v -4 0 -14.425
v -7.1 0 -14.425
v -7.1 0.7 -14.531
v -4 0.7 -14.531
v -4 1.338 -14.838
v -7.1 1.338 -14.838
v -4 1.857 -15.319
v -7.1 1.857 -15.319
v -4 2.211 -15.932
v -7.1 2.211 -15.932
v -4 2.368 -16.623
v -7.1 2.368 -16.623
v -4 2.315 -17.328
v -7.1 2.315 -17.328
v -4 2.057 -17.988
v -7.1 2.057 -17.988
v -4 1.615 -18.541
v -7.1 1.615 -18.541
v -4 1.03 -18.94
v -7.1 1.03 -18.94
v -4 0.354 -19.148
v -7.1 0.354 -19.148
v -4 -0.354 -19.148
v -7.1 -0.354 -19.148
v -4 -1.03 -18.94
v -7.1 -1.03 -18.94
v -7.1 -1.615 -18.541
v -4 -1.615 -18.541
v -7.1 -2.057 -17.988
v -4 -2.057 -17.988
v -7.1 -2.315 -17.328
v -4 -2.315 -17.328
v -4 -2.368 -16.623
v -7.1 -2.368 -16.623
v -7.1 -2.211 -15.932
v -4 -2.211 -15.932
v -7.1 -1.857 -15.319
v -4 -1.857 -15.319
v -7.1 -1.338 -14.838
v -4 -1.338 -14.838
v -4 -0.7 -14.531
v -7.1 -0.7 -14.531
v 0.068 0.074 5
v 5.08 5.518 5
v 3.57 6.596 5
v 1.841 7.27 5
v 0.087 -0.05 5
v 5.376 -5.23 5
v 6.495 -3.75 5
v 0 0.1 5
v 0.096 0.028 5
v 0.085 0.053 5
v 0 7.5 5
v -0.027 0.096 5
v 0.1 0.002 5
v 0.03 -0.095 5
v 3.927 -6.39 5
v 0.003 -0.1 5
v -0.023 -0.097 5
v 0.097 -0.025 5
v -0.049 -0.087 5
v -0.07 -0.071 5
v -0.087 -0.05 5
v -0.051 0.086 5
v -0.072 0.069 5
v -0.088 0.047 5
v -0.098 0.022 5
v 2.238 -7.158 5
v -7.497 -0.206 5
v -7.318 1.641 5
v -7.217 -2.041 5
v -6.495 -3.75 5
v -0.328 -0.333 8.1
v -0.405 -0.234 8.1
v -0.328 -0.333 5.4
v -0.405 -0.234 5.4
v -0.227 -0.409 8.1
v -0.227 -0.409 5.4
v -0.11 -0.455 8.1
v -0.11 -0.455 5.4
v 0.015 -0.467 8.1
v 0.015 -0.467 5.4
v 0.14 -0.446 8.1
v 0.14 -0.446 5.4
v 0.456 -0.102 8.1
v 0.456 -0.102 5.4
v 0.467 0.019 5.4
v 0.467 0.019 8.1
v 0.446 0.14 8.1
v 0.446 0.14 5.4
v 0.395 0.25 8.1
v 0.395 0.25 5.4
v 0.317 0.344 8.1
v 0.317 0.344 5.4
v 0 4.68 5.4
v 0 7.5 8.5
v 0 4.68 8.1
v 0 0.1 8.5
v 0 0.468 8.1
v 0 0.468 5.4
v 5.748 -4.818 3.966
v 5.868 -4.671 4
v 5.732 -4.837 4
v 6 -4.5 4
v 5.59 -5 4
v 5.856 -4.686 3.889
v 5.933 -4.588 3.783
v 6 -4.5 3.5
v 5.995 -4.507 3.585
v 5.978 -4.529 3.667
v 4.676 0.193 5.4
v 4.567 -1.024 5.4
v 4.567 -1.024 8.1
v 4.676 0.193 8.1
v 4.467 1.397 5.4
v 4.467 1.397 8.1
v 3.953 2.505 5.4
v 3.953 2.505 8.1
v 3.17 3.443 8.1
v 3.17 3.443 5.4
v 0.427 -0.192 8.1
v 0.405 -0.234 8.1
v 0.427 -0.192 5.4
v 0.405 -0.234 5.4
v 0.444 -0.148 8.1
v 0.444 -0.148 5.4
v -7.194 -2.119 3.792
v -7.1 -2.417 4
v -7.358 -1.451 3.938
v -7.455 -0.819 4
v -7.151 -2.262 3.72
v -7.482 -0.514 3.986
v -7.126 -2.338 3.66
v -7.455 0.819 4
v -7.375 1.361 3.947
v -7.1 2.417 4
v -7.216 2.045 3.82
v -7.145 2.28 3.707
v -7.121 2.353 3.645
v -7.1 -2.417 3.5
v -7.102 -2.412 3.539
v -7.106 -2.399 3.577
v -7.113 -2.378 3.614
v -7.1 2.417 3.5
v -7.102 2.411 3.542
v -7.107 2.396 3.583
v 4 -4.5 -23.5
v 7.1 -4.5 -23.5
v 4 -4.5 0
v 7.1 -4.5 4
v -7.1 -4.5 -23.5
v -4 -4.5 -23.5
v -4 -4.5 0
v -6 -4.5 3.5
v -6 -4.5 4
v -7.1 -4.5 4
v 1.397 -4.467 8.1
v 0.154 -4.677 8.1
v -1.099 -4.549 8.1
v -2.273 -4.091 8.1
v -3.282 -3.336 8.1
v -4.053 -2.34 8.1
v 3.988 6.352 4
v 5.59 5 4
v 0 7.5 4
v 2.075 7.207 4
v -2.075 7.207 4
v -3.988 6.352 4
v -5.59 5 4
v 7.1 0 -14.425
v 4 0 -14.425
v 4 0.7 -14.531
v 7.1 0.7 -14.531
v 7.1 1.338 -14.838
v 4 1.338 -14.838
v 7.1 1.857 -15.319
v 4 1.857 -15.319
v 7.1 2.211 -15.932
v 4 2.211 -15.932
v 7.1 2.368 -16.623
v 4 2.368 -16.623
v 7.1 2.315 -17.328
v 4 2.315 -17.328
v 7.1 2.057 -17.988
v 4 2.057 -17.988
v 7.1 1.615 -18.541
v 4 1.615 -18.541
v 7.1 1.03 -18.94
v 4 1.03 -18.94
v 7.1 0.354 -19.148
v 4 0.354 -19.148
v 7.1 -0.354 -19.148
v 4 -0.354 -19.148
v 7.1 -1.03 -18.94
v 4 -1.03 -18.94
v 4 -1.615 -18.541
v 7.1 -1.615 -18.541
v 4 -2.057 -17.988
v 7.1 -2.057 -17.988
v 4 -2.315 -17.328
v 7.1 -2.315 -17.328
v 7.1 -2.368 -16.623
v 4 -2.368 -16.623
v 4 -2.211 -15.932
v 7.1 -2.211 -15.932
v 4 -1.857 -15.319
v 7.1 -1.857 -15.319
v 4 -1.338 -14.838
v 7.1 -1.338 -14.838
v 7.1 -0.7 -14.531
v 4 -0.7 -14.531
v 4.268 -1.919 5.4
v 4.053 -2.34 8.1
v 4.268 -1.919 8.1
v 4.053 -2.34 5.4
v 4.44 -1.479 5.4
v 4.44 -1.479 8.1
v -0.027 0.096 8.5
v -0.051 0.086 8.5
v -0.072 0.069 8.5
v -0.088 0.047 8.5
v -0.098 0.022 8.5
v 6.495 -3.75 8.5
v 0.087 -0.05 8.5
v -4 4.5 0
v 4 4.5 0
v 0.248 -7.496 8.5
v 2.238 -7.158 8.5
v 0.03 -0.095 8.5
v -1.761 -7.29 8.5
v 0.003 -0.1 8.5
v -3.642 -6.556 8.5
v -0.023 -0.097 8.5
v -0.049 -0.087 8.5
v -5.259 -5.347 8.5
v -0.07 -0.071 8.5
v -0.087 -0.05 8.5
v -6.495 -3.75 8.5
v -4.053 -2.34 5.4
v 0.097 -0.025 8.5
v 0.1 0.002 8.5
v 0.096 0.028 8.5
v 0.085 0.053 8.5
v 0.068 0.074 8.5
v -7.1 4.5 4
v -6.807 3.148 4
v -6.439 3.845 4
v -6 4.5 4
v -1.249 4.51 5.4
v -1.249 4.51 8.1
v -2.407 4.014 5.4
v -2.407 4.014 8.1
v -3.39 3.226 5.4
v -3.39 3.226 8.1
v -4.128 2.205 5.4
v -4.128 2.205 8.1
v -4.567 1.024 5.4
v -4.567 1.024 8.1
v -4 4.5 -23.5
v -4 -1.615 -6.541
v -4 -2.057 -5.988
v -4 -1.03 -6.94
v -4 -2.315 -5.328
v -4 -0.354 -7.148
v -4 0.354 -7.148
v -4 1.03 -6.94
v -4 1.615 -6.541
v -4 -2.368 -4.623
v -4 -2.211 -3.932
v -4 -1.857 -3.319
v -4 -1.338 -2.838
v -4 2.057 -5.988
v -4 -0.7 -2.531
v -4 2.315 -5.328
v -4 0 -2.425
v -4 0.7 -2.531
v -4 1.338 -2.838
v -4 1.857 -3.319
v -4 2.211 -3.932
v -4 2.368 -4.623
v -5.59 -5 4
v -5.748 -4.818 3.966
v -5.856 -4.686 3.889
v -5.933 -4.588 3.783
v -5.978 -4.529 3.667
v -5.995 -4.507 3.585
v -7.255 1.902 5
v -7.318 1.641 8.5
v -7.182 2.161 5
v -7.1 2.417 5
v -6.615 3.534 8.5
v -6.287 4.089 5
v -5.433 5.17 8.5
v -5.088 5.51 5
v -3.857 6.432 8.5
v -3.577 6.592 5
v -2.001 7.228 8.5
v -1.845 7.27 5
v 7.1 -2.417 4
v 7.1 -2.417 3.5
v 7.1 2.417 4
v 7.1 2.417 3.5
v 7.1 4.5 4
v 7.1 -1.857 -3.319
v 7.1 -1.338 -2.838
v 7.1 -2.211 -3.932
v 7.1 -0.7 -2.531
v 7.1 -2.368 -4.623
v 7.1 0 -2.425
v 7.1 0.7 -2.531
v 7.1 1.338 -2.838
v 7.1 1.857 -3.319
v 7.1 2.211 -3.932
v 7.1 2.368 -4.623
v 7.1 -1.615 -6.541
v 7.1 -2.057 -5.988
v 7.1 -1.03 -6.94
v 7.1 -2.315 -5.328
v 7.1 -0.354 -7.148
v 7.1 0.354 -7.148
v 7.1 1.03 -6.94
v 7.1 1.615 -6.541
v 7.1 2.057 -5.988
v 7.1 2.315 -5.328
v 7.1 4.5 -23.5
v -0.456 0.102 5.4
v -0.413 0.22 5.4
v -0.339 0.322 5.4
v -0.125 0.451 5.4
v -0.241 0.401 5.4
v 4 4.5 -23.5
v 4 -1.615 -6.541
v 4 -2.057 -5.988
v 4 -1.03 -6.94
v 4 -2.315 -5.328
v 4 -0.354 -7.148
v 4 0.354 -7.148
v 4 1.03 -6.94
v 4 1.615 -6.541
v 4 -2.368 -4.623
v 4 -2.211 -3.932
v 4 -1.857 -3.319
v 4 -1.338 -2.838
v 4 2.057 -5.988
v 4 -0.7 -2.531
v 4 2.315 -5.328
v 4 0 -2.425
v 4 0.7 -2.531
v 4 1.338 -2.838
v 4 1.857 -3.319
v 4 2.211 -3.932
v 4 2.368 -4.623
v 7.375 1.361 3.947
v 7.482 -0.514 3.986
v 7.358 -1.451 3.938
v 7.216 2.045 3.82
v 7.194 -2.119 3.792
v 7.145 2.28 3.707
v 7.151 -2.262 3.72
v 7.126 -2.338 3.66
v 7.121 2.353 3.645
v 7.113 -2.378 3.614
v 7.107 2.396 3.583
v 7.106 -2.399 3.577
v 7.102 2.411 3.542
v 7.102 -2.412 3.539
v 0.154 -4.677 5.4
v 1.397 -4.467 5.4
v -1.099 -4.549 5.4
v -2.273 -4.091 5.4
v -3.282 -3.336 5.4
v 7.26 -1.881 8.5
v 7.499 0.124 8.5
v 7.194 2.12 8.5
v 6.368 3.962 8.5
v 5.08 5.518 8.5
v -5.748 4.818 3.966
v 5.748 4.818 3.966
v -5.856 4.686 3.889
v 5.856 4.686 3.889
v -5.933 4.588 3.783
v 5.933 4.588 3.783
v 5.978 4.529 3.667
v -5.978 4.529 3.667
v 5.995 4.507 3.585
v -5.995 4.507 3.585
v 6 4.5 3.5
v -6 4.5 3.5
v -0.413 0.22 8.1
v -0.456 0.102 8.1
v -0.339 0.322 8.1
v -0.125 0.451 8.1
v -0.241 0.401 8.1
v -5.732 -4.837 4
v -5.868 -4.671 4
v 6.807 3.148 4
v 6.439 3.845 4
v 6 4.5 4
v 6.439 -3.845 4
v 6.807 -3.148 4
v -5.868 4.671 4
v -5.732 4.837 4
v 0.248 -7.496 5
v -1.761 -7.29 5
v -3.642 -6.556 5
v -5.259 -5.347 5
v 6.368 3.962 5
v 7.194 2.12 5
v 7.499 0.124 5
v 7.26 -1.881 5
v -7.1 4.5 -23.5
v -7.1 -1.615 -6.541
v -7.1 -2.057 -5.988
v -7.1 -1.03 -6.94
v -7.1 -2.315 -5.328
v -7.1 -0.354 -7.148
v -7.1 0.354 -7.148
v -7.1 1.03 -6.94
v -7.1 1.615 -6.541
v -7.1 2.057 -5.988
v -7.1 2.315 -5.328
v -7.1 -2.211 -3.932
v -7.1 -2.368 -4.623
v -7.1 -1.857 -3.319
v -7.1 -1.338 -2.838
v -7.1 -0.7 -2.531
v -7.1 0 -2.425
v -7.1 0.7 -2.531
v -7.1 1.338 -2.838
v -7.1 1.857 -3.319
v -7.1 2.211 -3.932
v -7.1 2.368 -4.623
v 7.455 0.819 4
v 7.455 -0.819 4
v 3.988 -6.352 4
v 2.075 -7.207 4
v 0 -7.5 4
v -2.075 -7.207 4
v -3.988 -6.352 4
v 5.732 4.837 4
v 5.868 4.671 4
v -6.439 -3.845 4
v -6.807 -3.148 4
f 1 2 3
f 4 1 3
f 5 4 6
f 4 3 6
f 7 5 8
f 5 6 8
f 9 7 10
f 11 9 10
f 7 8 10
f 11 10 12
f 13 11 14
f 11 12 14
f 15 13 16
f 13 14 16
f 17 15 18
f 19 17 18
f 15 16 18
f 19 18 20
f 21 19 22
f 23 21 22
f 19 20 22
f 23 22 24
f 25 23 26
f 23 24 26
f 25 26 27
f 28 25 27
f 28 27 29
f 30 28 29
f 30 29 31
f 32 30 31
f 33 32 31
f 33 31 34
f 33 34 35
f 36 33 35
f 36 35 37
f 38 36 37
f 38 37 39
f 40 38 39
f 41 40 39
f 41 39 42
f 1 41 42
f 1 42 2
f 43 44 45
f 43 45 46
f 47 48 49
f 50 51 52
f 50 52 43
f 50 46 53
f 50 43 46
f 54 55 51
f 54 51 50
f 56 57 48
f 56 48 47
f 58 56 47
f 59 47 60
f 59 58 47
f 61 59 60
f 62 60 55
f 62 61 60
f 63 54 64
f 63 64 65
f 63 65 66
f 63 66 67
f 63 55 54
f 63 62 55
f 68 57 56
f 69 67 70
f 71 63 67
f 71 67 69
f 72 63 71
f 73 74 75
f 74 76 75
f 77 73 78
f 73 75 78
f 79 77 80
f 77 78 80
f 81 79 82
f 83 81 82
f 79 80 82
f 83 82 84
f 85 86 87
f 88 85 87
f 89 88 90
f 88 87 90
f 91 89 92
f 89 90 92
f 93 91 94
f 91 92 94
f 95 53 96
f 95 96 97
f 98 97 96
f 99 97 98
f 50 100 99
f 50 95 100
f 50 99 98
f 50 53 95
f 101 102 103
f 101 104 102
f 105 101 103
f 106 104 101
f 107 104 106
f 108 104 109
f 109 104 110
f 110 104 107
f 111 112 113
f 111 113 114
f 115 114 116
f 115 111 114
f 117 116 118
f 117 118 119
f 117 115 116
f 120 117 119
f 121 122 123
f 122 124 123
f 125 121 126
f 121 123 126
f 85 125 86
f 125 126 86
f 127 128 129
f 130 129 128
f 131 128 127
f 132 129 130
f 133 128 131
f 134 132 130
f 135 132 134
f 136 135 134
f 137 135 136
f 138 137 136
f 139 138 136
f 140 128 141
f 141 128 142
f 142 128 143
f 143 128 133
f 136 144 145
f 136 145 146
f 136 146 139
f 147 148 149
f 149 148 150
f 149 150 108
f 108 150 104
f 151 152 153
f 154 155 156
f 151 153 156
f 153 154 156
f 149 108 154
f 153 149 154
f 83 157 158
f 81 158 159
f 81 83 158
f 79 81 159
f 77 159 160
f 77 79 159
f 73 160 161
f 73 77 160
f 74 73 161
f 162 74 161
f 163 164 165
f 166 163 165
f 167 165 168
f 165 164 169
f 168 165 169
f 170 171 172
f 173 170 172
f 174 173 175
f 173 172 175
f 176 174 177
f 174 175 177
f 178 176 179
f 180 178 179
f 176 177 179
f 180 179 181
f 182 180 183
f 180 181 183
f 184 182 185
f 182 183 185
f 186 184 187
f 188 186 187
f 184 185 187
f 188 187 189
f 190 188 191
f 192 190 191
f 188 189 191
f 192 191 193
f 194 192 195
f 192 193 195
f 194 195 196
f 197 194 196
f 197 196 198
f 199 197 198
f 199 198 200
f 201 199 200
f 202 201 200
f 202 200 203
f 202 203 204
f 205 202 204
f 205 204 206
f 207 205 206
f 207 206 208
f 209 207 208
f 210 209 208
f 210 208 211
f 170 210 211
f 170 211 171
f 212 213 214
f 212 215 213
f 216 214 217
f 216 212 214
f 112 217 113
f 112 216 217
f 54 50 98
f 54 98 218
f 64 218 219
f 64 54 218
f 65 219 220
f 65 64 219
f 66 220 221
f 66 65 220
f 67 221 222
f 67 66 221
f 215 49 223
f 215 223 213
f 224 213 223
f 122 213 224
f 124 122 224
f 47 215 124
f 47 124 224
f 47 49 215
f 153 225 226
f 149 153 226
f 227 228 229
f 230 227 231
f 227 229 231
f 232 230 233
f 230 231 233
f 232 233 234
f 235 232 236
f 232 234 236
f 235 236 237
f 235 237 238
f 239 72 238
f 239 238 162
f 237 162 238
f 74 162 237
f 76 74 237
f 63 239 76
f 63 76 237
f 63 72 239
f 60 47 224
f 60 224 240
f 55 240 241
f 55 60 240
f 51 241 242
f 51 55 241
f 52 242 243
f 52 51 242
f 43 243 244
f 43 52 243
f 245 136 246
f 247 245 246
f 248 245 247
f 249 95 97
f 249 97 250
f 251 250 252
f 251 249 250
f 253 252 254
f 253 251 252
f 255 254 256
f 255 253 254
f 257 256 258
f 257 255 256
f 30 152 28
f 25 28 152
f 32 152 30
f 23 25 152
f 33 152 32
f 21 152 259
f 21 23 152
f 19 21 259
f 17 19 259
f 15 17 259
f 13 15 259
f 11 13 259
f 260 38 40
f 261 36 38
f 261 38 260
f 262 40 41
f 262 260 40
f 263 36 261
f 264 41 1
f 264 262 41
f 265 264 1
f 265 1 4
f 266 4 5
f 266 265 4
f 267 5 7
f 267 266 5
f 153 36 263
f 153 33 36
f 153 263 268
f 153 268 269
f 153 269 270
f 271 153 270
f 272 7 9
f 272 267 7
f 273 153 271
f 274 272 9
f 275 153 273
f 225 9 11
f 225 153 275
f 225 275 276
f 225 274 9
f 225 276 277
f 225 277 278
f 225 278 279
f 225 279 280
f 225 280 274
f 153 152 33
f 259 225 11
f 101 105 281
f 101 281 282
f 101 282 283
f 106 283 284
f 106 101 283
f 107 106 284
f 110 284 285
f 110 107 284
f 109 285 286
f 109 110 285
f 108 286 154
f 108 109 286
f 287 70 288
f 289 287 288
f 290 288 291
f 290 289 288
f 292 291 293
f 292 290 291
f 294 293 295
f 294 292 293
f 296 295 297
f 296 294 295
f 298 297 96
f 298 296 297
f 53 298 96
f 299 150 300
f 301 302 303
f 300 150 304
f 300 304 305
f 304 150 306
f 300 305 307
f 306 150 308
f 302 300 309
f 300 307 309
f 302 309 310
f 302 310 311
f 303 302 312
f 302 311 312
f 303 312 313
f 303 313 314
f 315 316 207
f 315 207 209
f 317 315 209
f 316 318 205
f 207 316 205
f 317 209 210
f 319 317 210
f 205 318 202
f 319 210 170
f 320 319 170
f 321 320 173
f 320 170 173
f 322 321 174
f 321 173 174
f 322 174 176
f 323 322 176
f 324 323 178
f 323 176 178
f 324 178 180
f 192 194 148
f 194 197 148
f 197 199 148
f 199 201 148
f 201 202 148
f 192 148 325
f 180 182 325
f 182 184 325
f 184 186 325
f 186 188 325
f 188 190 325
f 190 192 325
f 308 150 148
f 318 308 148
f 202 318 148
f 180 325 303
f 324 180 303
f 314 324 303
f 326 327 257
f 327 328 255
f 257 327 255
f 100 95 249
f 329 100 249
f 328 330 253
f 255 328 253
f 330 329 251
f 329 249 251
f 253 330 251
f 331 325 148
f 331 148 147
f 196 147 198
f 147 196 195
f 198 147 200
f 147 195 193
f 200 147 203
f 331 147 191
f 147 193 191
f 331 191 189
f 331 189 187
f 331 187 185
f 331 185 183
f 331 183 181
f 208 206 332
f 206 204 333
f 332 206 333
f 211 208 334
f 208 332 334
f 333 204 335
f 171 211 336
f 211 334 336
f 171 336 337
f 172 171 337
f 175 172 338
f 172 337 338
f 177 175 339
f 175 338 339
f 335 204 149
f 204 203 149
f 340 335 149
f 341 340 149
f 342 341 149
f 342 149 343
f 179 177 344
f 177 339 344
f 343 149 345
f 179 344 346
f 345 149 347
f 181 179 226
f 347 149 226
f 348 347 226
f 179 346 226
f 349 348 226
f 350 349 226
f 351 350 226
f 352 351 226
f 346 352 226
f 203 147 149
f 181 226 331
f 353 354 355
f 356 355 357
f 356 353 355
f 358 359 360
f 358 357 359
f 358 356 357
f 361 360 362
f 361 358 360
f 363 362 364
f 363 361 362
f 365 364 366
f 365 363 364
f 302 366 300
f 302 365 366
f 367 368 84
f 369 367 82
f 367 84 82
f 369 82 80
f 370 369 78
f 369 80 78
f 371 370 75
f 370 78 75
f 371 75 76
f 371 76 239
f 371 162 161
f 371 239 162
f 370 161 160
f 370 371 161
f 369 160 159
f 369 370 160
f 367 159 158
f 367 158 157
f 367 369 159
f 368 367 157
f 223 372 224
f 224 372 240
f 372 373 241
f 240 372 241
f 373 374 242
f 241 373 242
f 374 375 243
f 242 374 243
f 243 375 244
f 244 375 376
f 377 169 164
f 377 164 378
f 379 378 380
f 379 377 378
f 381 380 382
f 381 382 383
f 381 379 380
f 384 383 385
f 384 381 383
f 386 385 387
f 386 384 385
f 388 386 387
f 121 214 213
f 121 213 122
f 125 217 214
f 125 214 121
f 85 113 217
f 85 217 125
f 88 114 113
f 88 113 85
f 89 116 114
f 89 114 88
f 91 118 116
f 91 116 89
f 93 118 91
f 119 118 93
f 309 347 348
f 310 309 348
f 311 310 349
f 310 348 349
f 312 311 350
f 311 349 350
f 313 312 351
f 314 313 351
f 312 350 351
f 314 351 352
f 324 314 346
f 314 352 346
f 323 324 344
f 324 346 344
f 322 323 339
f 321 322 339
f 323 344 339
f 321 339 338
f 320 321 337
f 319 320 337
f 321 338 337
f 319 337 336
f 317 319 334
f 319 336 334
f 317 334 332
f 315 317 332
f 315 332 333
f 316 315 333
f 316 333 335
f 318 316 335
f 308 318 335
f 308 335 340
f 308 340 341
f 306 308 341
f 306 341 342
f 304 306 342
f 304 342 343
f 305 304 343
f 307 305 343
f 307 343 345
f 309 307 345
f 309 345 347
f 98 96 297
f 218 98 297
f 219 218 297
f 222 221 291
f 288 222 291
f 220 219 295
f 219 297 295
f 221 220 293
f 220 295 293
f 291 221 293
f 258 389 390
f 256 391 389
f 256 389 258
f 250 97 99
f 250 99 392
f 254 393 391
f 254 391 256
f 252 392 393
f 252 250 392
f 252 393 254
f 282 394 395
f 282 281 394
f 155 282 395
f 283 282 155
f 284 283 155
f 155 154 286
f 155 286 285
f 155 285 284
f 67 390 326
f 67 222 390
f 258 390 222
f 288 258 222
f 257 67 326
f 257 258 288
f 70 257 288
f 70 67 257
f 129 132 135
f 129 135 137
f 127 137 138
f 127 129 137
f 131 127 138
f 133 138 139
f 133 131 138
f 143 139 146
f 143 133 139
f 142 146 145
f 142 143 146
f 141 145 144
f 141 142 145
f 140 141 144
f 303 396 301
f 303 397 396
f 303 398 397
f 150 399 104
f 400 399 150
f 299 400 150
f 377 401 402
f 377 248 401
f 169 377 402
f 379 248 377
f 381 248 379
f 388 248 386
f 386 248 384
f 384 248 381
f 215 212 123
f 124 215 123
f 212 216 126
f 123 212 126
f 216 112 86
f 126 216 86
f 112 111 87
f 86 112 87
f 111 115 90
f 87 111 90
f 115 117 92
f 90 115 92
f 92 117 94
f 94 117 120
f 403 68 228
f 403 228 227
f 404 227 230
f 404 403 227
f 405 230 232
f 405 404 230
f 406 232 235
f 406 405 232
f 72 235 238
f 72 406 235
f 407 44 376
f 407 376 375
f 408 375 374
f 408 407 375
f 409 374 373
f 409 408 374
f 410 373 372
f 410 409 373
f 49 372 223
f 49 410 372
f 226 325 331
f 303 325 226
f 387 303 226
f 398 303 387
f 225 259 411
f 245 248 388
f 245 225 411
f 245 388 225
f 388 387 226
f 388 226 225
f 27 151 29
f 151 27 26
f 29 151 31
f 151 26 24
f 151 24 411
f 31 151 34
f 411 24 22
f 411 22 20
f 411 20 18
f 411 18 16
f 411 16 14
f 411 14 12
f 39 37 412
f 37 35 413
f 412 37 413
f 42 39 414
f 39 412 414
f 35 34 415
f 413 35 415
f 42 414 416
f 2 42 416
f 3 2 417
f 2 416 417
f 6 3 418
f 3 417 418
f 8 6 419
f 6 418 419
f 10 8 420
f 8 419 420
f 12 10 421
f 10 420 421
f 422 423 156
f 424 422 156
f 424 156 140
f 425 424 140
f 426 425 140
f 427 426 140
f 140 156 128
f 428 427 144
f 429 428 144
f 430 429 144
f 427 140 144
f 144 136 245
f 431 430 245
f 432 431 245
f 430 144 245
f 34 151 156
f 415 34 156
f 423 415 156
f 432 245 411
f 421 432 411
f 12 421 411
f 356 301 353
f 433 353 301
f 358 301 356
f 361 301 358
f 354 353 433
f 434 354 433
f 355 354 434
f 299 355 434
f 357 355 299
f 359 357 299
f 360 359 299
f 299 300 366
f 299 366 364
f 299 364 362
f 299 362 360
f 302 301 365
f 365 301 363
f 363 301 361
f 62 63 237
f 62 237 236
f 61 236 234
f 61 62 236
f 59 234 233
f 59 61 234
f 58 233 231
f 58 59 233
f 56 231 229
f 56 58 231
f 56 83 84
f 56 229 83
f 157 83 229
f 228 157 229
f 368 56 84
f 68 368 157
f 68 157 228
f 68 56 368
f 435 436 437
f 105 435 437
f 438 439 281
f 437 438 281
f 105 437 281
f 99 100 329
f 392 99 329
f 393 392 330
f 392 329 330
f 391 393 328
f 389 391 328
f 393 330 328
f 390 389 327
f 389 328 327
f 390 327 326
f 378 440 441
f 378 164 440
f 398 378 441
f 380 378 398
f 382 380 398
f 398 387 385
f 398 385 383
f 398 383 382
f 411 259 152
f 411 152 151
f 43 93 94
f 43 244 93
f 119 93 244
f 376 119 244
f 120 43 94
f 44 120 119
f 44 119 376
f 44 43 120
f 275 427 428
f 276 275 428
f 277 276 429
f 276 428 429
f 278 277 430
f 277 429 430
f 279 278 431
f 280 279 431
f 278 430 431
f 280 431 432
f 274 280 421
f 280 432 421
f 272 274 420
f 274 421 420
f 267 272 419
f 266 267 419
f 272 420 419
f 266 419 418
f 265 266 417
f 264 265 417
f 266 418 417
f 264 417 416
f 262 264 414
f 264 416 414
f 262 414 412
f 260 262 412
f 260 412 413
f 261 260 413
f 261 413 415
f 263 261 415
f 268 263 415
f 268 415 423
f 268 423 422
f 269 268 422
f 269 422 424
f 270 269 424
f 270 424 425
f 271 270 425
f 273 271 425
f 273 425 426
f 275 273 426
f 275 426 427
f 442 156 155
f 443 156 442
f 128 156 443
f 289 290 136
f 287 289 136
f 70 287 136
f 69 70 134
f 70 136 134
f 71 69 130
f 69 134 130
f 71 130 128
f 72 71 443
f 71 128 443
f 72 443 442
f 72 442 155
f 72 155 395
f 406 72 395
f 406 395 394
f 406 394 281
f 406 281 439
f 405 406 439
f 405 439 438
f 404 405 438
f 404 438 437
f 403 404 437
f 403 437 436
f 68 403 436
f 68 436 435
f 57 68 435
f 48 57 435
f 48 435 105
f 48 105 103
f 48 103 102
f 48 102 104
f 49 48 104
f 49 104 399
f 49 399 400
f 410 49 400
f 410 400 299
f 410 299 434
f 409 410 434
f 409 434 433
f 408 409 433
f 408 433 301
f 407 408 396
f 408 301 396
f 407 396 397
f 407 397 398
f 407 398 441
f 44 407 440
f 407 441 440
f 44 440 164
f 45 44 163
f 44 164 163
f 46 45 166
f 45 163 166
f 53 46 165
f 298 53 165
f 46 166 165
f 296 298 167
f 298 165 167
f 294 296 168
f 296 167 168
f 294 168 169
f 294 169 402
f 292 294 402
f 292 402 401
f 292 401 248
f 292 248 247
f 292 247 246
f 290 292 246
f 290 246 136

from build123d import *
from build123d.topology import SkipClean

# Parameters (mm, degrees)
ESQUISSE1_W             = 14.2
ESQUISSE1_H             = 9
BOSS_EXTRU_3_DEPTH      = 4
ESQUISSE4_W             = 3.1
ESQUISSE4_H             = 9
BOSS_EXTRU_4_DEPTH      = 23.5
ESQUISSE5_R             = 2.375
ENL_V_MAT_EXTRU_2_DEPTH = 28.823371471
ESQUISSE6_R             = 7.5
BOSS_EXTRU_5_DEPTH      = 1
CONG_1_R                = 0.5
EXTRU_MINCE1_DEPTH      = 3.5
ESQUISSE10_R            = 0.5
ESQUISSE10_W            = 4.21226809
ESQUISSE10_H            = 2.7


with BuildPart() as part:
    # Esquisse1 → Boss.-Extru.3 (new body)
    with BuildSketch(Plane.XY):
        Rectangle(ESQUISSE1_W, ESQUISSE1_H)
    extrude(amount=BOSS_EXTRU_3_DEPTH)

    # Esquisse4 → Boss.-Extru.4 (add)
    with BuildSketch(Plane(origin=(0, 0, 0), x_dir=(-1, 0, 0), z_dir=(0, 0, -1))):
        with Locations((5.55, 0)):
            Rectangle(ESQUISSE4_W, ESQUISSE4_H)
        with Locations((-5.55, 0)):
            Rectangle(ESQUISSE4_W, ESQUISSE4_H)
    extrude(amount=BOSS_EXTRU_4_DEPTH)

    # Esquisse5 → Enlèv. mat.-Extru.2 (cut, through all)
    with BuildSketch(Plane.ZY.offset(7.1)):
        with Locations((-16.8, 0)):
            Circle(ESQUISSE5_R)
        with Locations((-4.8, 0)):
            Circle(ESQUISSE5_R)
    extrude(amount=-ENL_V_MAT_EXTRU_2_DEPTH, mode=Mode.SUBTRACT)

    # Esquisse6 → Boss.-Extru.5 (add)
    with BuildSketch(Plane.XY.offset(4)):
        with Locations(Location((0, 0, 0), (0, 0, 161.203094965))):
            Circle(ESQUISSE6_R)
    extrude(amount=BOSS_EXTRU_5_DEPTH)

    # Congé1
    # the kernel refuses this fillet: 0.5 mm, written as the material it adds along each edge
    with BuildSketch(Plane(origin=(-7.1, -3.666609195, 4), x_dir=(0, 0, -1), z_dir=(0, 1, 0))) as cong_1_piece_1_section:
        with BuildLine():
            CenterArc((CONG_1_R, CONG_1_R), CONG_1_R, 180, 90)
            Line((0, CONG_1_R), (0, 0))
            Line((0, 0), (CONG_1_R, 0))
        make_face()
    cong_1_piece_1 = extrude(amount=7.333218389, mode=Mode.PRIVATE)
    cong_1_piece_1 = cong_1_piece_1 & Plane(origin=(0, 0, 3.878104255), x_dir=(-0.946666666666828, 0.3222145592953816, 0), z_dir=(0, 0, -1)) * Cylinder(7.5, 17, mode=Mode.PRIVATE)
    add(cong_1_piece_1)
    with BuildSketch(Plane(origin=(7.25, -4.5, 4), x_dir=(0, 0, -1), z_dir=(-1, 0, 0))) as cong_1_piece_2_section:
        with BuildLine():
            CenterArc((CONG_1_R, CONG_1_R), CONG_1_R, 180, 90)
            Line((0, CONG_1_R), (0, 0))
            Line((0, 0), (CONG_1_R, 0))
        make_face()
    cong_1_piece_2 = extrude(amount=14.5, mode=Mode.PRIVATE)
    cong_1_piece_2 = cong_1_piece_2 & Plane(origin=(0, 0, 3.887627019), x_dir=(-0.946666666666828, 0.3222145592953816, 0), z_dir=(0, 0, -1)) * Cylinder(7.5, 32, mode=Mode.PRIVATE)
    add(cong_1_piece_2)
    with BuildSketch(Plane(origin=(7.1, 3.666609195, 4), x_dir=(0, 0, -1), z_dir=(0, -1, 0))) as cong_1_piece_3_section:
        with BuildLine():
            CenterArc((CONG_1_R, CONG_1_R), CONG_1_R, 180, 90)
            Line((0, CONG_1_R), (0, 0))
            Line((0, 0), (CONG_1_R, 0))
        make_face()
    cong_1_piece_3 = extrude(amount=7.333218389, mode=Mode.PRIVATE)
    cong_1_piece_3 = cong_1_piece_3 & Plane(origin=(0, 0, 3.87809802), x_dir=(-0.946666666666828, 0.3222145592953816, 0), z_dir=(0, 0, -1)) * Cylinder(7.5, 17, mode=Mode.PRIVATE)
    add(cong_1_piece_3)
    with BuildSketch(Plane(origin=(-7.25, 4.5, 4), x_dir=(0, 0, -1), z_dir=(1, 0, 0))) as cong_1_piece_4_section:
        with BuildLine():
            CenterArc((CONG_1_R, CONG_1_R), CONG_1_R, 180, 90)
            Line((0, CONG_1_R), (0, 0))
            Line((0, 0), (CONG_1_R, 0))
        make_face()
    cong_1_piece_4 = extrude(amount=14.5, mode=Mode.PRIVATE)
    cong_1_piece_4 = cong_1_piece_4 & Plane(origin=(0, 0, 3.88762702), x_dir=(-0.946666666666828, 0.3222145592953816, 0), z_dir=(0, 0, -1)) * Cylinder(7.5, 32, mode=Mode.PRIVATE)
    add(cong_1_piece_4)

    # Esquisse8 → Extru.-Mince1 (add)
    with SkipClean():  # the faces are left unmerged after this step: merging them gives an invalid solid
        with BuildSketch(Plane.XY.offset(5)):
            with BuildLine():
                ThreePointArc((5.080001443, 5.517570601), (7.414056481, 1.132151268), (6.495190528, -3.75))
                Line((6.495190528, -3.75), (0.08660254, -0.05))
                ThreePointArc((0.08660254, -0.05), (0.098854086, 0.01509535), (0.067733353, 0.073567608))
                Line((0.067733353, 0.073567608), (5.080001443, 5.517570601))
            make_face()
            with BuildLine():
                ThreePointArc((2.238355587, -7.158195601), (-2.726556481, -6.986836892), (-6.495190528, -3.75))
                Line((-6.495190528, -3.75), (-0.08660254, -0.05))
                ThreePointArc((-0.08660254, -0.05), (-0.036354086, -0.093157825), (0.029844741, -0.095442608))
                Line((0.029844741, -0.095442608), (2.238355587, -7.158195601))
            make_face()
            with BuildLine():
                ThreePointArc((-7.318357029, 1.640625), (-4.6875, 5.854685623), (0, 7.5))
                Line((0, 7.5), (0, 0.1))
                ThreePointArc((0, 0.1), (-0.0625, 0.078062475), (-0.097578094, 0.021875))
                Line((-0.097578094, 0.021875), (-7.318357029, 1.640625))
            make_face()
        extrude(amount=EXTRU_MINCE1_DEPTH)
    add(part.part.scale(1), mode=Mode.REPLACE)  # the faces are merged on a copy

    # Esquisse10 → Enlèvement de matière-Révolution1 (revolve, cut)
    with BuildSketch(Plane(origin=(0, 0, 0), x_dir=(1, 0, 0), z_dir=(0, 1, 0)), mode=Mode.PRIVATE) as enl_vement_de_mati_re_r_volution1_sk:
        with Locations((-4, -6.75)):
            Circle(ESQUISSE10_R)
        with Locations((2.573867398, -6.75)):
            Rectangle(ESQUISSE10_W, ESQUISSE10_H)
    revolve(enl_vement_de_mati_re_r_volution1_sk.sketch.rotate(Axis((0, 0, 2.6), (0, 0, 1)), 347.364374907), axis=Axis((0, 0, 2.6), (0, 0, 1)), mode=Mode.SUBTRACT)


solid = part.part
